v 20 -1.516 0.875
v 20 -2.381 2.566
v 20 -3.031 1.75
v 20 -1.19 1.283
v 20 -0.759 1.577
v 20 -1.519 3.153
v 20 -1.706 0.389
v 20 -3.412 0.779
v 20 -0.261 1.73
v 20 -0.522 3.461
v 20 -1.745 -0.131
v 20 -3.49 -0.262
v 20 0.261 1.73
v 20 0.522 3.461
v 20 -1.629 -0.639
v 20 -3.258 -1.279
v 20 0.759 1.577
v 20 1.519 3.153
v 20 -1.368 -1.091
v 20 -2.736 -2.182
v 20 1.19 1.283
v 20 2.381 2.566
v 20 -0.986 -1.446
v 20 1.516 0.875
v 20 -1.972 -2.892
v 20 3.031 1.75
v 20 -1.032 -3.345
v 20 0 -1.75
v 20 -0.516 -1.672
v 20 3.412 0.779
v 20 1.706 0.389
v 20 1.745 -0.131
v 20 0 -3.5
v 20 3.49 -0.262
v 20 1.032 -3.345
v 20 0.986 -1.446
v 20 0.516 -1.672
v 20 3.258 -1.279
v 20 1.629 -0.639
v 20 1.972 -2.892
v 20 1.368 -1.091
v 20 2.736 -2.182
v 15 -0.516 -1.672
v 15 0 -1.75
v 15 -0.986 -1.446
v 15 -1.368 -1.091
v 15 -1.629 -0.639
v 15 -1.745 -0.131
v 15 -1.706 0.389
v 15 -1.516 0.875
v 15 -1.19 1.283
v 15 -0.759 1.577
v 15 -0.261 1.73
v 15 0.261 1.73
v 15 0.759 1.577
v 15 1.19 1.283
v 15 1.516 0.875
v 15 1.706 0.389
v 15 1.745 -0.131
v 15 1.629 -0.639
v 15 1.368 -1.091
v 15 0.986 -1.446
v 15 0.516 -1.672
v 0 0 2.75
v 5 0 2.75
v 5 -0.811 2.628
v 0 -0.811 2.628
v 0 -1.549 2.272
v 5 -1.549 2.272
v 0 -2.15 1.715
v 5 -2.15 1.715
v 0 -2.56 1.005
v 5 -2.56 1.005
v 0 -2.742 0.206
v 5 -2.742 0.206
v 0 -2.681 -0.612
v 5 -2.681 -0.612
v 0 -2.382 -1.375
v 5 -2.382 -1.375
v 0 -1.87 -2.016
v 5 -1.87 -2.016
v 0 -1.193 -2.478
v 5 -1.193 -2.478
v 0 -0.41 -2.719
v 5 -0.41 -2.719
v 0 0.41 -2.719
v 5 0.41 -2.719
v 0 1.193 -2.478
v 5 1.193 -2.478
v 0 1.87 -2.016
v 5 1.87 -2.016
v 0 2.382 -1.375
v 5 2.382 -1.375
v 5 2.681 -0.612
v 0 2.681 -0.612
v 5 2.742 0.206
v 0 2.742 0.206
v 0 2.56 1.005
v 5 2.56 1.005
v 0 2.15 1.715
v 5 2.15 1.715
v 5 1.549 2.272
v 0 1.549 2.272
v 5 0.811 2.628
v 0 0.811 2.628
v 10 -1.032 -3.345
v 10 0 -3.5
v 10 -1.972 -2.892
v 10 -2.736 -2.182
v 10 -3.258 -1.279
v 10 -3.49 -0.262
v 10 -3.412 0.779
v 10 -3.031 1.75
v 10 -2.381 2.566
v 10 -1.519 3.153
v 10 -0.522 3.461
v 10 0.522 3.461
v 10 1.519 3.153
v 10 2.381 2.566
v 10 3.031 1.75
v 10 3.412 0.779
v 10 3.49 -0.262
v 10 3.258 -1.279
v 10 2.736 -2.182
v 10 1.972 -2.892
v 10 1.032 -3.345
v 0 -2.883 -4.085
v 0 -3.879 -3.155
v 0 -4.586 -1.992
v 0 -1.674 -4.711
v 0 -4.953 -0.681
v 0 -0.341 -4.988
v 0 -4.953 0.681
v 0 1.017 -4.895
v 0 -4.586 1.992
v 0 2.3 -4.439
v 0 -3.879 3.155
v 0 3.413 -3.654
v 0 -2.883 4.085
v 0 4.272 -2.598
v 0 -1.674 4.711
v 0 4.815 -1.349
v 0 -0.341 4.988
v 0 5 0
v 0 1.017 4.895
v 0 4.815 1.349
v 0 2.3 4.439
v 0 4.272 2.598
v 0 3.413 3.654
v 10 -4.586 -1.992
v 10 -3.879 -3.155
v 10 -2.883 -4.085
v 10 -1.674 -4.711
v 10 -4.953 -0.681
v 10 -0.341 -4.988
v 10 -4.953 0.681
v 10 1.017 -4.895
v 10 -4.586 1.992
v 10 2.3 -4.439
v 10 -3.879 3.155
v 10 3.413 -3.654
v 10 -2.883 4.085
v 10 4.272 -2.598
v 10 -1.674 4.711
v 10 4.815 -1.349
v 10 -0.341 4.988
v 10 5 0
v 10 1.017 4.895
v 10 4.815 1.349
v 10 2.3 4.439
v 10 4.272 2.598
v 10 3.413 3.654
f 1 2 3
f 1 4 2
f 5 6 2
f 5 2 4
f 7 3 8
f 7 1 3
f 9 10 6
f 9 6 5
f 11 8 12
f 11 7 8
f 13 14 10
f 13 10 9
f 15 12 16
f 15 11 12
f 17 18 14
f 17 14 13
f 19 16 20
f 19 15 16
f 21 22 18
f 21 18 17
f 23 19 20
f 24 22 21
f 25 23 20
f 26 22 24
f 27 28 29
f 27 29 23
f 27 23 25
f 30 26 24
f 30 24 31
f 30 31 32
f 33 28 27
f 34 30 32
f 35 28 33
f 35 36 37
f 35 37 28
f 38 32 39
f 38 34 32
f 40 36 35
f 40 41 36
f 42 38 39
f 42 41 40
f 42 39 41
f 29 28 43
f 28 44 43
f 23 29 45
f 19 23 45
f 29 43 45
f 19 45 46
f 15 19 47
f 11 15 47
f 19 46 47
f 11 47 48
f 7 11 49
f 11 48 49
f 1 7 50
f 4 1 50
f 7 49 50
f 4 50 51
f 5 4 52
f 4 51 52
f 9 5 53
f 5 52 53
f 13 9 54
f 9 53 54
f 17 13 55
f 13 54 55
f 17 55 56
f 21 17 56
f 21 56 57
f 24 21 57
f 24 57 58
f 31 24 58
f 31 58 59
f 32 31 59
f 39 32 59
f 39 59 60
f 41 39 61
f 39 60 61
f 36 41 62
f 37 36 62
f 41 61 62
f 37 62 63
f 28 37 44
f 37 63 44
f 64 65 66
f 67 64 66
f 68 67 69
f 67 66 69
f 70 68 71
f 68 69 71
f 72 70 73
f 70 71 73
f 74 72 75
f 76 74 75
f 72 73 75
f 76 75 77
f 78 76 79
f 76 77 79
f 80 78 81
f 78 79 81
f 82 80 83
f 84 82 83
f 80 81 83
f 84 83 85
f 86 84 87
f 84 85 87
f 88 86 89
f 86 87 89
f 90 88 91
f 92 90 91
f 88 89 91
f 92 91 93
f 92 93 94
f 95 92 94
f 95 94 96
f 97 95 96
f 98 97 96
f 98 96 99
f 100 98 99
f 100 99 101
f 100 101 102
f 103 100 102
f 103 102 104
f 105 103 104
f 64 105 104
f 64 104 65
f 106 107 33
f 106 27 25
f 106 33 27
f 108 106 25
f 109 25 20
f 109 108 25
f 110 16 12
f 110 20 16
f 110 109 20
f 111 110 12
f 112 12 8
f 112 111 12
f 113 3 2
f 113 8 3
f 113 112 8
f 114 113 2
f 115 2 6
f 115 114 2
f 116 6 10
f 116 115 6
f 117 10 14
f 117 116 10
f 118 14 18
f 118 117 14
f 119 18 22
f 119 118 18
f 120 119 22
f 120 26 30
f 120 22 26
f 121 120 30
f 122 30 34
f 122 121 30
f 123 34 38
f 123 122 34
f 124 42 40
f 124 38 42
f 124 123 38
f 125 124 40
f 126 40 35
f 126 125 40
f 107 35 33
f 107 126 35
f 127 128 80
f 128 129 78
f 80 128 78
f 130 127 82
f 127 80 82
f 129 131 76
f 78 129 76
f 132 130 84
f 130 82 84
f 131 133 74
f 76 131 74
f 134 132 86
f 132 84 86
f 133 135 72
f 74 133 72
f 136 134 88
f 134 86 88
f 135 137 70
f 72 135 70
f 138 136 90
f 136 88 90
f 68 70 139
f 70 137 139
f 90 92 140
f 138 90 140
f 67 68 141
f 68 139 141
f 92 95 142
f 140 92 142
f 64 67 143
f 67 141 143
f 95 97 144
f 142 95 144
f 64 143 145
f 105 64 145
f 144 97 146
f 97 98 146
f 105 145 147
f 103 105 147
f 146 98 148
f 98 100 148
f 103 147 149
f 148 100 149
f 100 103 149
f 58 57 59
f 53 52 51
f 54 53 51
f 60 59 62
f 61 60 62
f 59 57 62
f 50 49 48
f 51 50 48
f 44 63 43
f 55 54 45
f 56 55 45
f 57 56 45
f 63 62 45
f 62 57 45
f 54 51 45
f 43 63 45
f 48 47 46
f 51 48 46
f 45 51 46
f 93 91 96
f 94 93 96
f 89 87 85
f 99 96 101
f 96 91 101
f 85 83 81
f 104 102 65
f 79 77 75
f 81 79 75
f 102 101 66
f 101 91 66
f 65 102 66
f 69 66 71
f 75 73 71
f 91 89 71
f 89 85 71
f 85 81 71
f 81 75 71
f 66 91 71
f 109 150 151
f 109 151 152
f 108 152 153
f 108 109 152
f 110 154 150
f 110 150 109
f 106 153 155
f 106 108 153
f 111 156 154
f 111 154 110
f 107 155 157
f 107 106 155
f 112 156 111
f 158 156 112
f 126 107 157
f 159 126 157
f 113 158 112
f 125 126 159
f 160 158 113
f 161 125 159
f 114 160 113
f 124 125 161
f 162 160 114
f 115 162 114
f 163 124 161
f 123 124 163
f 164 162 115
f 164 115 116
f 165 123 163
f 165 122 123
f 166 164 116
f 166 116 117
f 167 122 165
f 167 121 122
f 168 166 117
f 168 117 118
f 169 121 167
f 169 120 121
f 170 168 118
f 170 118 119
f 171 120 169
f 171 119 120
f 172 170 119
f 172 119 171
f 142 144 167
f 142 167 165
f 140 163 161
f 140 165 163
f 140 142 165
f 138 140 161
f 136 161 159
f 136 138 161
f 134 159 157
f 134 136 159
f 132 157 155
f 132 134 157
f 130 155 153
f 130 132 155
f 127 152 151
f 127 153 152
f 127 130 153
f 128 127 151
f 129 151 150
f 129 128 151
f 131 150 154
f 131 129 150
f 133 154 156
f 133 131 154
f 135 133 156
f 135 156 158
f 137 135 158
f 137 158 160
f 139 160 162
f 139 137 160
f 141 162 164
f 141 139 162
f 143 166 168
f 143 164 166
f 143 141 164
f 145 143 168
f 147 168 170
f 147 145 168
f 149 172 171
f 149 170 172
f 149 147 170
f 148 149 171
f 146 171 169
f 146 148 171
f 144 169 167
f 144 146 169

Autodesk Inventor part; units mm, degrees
ref_plane "YZ Plane" through (0, 0, 0) normal (1, 0, 0) x (0, 1, 0)
ref_plane "XZ Plane" through (0, 0, 0) normal (0, 1, 0) x (-1, 0, 0)
ref_plane "XY Plane" through (0, 0, 0) normal (0, 0, 1) x (1, 0, 0)
sketch "Sketch4" plane through (0, 0, 0) normal (1, 0, 0) x (0, 1, 0)
  circle A0 centre (0, 0) radius 2.75
  circle A1 centre (0, 0) radius 5
  dimension "d19" = 5.5
  dimension "d20" = 10
extrude "Extrusion2" add sketch "Sketch4" along normal blind 10 contours A0 | A1
sketch "Sketch5" plane through (0, 0, 0) normal (-1, 0, 0) x (0, 0, 1)
  circle A0 centre (0, 0) radius 2.75
  dimension "d23" = 5.5
hole "Hole3" at (0, 0, 0) direction (1, 0, 0) diameter 5.5 depth 5
sketch "Sketch6" plane through (10, 0, 0) normal (1, 0, 0) x (0, 0, -1)
  circle A0 centre (0, 0) radius 3.5
  dimension "d31" = 7
extrude "Extrusion3" add sketch "Sketch6" along normal blind 10
sketch "Sketch7" plane through (20, 0, 0) normal (1, 0, 0) x (0, 0, -1)
  circle A0 centre (0, 0) radius 3
  dimension "d34" = 6
hole "Hole4" at (20, 0, 0) direction (-1, 0, 0) diameter 3.5 depth 5
properties part number "acople"
